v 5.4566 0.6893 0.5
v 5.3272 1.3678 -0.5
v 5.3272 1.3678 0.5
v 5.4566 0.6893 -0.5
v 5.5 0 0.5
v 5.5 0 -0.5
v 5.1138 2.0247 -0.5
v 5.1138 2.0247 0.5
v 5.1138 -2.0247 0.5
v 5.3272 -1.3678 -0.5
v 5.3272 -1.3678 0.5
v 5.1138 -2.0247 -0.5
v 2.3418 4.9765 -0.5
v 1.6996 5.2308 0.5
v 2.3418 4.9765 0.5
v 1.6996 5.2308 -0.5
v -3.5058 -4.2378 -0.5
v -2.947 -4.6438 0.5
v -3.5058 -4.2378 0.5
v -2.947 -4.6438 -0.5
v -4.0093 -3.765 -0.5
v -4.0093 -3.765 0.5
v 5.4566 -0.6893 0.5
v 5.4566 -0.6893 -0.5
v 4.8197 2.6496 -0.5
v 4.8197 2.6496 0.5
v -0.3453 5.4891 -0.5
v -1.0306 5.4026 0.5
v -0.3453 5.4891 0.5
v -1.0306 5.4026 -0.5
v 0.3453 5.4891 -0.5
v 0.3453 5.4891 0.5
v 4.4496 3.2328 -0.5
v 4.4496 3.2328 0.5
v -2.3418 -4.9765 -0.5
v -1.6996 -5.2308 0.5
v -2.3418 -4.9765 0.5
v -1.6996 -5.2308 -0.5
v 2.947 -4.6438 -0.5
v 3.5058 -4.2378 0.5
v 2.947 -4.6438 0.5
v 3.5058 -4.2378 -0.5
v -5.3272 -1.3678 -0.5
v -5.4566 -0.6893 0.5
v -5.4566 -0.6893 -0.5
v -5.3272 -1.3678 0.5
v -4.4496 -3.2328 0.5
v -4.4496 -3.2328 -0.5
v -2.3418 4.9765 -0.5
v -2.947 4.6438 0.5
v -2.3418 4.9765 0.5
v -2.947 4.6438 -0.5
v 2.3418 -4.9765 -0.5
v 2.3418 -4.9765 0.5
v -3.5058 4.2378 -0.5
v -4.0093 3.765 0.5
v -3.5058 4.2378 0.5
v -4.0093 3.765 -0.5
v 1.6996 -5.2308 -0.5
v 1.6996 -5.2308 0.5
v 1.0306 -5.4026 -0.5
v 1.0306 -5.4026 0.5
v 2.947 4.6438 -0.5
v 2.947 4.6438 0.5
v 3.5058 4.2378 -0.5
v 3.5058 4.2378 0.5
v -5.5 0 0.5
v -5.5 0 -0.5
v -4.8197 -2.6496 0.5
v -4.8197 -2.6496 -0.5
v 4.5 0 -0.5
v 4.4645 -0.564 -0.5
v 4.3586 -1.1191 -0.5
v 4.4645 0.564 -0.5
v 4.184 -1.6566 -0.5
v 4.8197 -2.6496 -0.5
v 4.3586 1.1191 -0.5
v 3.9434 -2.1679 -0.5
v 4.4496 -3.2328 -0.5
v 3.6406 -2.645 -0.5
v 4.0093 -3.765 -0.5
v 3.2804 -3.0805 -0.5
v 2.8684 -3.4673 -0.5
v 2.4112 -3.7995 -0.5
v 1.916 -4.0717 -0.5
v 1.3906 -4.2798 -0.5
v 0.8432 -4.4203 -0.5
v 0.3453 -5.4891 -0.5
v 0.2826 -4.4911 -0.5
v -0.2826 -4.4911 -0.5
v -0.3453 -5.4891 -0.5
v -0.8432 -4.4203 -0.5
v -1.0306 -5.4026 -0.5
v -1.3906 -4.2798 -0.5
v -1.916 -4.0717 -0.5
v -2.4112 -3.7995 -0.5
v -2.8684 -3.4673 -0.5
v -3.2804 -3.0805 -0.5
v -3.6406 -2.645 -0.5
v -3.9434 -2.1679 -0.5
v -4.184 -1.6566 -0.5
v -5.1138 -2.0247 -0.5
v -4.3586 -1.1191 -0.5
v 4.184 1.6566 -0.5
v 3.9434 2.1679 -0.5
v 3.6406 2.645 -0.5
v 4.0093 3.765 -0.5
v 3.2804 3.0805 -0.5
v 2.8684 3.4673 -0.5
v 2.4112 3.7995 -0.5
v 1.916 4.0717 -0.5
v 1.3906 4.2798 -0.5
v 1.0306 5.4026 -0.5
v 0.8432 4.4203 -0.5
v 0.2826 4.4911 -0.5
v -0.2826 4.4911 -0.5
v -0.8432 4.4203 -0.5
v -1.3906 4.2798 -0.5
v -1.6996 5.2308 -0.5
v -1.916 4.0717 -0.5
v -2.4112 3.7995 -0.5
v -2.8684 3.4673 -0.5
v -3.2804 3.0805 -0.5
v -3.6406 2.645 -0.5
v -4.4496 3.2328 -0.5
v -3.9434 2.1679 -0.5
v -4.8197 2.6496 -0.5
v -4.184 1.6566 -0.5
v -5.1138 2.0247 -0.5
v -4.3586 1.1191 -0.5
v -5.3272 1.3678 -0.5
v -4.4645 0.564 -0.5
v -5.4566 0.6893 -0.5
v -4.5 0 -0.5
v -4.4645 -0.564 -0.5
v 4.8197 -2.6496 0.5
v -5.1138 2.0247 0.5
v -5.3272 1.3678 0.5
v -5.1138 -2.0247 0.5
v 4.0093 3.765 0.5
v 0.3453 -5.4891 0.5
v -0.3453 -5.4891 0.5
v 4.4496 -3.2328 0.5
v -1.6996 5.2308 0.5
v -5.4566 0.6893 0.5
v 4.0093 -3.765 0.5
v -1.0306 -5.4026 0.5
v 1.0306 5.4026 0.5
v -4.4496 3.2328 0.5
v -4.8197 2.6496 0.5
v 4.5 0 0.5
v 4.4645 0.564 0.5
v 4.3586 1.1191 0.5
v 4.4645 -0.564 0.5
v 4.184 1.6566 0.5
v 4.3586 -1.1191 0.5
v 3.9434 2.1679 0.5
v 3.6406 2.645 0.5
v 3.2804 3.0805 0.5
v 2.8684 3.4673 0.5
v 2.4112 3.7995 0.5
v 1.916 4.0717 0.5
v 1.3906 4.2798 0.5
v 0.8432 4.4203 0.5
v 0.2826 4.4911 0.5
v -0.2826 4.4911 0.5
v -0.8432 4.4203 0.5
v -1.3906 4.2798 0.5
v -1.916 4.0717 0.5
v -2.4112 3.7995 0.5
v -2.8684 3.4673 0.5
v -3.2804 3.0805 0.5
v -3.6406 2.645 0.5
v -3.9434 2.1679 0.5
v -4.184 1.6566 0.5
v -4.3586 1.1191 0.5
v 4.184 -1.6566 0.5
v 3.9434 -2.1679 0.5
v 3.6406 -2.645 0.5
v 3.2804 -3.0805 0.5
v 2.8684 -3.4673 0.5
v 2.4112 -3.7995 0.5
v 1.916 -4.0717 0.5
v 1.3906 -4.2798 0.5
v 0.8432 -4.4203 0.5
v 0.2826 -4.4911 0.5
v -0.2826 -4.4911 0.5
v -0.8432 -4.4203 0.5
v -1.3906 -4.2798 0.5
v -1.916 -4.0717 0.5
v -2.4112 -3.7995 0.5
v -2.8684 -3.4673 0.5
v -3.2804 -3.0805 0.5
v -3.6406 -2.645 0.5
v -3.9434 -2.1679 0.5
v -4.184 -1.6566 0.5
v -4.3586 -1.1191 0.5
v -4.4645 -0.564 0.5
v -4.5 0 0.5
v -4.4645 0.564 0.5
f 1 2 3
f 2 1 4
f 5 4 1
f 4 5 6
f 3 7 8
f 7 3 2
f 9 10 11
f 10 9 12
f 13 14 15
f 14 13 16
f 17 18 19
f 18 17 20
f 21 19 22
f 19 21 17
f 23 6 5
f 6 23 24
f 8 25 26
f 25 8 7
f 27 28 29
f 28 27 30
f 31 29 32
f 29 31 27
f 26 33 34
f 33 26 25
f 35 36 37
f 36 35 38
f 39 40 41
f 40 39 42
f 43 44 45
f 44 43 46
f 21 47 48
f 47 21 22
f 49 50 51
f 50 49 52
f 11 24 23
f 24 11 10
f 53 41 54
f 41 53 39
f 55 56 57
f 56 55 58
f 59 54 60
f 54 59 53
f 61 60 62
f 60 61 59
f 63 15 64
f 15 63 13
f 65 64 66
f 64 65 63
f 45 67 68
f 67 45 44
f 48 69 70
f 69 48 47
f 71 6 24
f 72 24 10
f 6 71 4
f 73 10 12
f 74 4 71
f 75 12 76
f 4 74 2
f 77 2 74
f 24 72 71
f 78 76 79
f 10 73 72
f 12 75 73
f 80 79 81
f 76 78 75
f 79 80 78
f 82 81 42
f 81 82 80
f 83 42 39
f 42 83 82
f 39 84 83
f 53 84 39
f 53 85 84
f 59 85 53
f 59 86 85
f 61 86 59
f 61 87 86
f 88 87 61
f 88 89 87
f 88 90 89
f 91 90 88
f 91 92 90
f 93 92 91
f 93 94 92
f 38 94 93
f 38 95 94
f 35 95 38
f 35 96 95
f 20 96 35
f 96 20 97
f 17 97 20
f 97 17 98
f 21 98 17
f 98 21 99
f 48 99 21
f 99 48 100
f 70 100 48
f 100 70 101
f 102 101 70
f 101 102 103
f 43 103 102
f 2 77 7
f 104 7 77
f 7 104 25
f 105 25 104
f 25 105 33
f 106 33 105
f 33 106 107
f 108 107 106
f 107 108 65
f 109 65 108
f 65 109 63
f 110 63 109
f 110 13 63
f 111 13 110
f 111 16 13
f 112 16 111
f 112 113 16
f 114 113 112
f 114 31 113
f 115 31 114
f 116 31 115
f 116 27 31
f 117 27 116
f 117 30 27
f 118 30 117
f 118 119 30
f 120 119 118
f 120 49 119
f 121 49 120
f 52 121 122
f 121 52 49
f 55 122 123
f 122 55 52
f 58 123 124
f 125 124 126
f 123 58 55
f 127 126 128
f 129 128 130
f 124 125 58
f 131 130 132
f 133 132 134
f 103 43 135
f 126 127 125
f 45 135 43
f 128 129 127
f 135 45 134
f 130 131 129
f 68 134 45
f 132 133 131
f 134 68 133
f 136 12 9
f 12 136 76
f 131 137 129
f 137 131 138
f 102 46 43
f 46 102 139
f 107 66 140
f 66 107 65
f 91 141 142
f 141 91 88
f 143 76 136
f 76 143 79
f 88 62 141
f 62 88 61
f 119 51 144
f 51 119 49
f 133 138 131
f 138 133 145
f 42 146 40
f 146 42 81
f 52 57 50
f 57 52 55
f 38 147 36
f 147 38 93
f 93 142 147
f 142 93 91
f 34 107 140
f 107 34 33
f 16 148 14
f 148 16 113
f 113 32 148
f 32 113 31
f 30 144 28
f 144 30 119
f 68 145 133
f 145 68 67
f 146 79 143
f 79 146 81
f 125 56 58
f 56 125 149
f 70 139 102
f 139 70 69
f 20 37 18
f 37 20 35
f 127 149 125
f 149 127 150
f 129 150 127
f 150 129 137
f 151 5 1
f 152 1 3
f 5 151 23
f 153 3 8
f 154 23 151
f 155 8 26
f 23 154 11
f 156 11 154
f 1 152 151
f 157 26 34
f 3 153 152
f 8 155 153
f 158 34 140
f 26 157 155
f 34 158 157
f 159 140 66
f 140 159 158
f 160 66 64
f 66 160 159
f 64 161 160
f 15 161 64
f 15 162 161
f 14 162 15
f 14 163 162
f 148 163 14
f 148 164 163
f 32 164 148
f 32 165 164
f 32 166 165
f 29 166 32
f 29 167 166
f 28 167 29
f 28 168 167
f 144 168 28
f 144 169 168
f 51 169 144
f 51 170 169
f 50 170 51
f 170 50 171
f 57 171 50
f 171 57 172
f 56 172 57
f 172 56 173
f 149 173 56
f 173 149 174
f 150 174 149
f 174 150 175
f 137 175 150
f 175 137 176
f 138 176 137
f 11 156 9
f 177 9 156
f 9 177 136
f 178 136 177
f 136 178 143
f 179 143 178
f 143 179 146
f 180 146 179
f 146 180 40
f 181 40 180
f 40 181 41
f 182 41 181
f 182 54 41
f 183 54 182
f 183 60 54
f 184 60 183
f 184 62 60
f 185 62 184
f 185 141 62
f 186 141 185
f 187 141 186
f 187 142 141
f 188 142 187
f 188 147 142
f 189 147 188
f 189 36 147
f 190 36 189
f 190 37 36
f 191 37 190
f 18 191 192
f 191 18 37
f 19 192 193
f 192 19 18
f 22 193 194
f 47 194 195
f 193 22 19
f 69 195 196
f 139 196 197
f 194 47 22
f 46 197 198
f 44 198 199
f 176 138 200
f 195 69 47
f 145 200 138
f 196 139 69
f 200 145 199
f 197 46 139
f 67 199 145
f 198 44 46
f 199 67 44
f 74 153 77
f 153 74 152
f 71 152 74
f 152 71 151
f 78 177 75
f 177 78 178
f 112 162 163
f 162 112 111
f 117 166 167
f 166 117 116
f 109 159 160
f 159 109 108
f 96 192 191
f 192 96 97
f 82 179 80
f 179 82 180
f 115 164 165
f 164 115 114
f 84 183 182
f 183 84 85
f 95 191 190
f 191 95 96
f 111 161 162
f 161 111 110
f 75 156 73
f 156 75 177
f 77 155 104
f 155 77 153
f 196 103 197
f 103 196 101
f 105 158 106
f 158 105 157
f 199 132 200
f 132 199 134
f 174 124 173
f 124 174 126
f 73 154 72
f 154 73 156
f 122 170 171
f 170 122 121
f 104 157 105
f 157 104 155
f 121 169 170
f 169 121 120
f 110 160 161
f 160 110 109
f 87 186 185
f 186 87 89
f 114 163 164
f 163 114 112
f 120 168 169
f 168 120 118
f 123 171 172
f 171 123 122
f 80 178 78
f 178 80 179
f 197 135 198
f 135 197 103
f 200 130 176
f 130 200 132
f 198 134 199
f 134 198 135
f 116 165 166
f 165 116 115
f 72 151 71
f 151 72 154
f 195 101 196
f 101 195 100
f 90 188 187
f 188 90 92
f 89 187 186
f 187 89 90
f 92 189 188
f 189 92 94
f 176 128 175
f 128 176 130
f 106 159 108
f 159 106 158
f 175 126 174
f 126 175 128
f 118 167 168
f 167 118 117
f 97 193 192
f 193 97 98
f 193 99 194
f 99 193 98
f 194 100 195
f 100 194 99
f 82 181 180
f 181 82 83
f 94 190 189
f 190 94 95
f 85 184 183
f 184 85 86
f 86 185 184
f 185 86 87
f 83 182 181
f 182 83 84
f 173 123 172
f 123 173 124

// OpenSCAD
$fn = 50;


difference() {
	union() {
		translate(v = [0, 0, -0.5000000000]) {
			cylinder(h = 1, r = 5.5000000000);
		}
	}
	union() {
		translate(v = [0, 0, -100.0000000000]) {
			cylinder(h = 200, r = 4.5000000000);
		}
	}
}
